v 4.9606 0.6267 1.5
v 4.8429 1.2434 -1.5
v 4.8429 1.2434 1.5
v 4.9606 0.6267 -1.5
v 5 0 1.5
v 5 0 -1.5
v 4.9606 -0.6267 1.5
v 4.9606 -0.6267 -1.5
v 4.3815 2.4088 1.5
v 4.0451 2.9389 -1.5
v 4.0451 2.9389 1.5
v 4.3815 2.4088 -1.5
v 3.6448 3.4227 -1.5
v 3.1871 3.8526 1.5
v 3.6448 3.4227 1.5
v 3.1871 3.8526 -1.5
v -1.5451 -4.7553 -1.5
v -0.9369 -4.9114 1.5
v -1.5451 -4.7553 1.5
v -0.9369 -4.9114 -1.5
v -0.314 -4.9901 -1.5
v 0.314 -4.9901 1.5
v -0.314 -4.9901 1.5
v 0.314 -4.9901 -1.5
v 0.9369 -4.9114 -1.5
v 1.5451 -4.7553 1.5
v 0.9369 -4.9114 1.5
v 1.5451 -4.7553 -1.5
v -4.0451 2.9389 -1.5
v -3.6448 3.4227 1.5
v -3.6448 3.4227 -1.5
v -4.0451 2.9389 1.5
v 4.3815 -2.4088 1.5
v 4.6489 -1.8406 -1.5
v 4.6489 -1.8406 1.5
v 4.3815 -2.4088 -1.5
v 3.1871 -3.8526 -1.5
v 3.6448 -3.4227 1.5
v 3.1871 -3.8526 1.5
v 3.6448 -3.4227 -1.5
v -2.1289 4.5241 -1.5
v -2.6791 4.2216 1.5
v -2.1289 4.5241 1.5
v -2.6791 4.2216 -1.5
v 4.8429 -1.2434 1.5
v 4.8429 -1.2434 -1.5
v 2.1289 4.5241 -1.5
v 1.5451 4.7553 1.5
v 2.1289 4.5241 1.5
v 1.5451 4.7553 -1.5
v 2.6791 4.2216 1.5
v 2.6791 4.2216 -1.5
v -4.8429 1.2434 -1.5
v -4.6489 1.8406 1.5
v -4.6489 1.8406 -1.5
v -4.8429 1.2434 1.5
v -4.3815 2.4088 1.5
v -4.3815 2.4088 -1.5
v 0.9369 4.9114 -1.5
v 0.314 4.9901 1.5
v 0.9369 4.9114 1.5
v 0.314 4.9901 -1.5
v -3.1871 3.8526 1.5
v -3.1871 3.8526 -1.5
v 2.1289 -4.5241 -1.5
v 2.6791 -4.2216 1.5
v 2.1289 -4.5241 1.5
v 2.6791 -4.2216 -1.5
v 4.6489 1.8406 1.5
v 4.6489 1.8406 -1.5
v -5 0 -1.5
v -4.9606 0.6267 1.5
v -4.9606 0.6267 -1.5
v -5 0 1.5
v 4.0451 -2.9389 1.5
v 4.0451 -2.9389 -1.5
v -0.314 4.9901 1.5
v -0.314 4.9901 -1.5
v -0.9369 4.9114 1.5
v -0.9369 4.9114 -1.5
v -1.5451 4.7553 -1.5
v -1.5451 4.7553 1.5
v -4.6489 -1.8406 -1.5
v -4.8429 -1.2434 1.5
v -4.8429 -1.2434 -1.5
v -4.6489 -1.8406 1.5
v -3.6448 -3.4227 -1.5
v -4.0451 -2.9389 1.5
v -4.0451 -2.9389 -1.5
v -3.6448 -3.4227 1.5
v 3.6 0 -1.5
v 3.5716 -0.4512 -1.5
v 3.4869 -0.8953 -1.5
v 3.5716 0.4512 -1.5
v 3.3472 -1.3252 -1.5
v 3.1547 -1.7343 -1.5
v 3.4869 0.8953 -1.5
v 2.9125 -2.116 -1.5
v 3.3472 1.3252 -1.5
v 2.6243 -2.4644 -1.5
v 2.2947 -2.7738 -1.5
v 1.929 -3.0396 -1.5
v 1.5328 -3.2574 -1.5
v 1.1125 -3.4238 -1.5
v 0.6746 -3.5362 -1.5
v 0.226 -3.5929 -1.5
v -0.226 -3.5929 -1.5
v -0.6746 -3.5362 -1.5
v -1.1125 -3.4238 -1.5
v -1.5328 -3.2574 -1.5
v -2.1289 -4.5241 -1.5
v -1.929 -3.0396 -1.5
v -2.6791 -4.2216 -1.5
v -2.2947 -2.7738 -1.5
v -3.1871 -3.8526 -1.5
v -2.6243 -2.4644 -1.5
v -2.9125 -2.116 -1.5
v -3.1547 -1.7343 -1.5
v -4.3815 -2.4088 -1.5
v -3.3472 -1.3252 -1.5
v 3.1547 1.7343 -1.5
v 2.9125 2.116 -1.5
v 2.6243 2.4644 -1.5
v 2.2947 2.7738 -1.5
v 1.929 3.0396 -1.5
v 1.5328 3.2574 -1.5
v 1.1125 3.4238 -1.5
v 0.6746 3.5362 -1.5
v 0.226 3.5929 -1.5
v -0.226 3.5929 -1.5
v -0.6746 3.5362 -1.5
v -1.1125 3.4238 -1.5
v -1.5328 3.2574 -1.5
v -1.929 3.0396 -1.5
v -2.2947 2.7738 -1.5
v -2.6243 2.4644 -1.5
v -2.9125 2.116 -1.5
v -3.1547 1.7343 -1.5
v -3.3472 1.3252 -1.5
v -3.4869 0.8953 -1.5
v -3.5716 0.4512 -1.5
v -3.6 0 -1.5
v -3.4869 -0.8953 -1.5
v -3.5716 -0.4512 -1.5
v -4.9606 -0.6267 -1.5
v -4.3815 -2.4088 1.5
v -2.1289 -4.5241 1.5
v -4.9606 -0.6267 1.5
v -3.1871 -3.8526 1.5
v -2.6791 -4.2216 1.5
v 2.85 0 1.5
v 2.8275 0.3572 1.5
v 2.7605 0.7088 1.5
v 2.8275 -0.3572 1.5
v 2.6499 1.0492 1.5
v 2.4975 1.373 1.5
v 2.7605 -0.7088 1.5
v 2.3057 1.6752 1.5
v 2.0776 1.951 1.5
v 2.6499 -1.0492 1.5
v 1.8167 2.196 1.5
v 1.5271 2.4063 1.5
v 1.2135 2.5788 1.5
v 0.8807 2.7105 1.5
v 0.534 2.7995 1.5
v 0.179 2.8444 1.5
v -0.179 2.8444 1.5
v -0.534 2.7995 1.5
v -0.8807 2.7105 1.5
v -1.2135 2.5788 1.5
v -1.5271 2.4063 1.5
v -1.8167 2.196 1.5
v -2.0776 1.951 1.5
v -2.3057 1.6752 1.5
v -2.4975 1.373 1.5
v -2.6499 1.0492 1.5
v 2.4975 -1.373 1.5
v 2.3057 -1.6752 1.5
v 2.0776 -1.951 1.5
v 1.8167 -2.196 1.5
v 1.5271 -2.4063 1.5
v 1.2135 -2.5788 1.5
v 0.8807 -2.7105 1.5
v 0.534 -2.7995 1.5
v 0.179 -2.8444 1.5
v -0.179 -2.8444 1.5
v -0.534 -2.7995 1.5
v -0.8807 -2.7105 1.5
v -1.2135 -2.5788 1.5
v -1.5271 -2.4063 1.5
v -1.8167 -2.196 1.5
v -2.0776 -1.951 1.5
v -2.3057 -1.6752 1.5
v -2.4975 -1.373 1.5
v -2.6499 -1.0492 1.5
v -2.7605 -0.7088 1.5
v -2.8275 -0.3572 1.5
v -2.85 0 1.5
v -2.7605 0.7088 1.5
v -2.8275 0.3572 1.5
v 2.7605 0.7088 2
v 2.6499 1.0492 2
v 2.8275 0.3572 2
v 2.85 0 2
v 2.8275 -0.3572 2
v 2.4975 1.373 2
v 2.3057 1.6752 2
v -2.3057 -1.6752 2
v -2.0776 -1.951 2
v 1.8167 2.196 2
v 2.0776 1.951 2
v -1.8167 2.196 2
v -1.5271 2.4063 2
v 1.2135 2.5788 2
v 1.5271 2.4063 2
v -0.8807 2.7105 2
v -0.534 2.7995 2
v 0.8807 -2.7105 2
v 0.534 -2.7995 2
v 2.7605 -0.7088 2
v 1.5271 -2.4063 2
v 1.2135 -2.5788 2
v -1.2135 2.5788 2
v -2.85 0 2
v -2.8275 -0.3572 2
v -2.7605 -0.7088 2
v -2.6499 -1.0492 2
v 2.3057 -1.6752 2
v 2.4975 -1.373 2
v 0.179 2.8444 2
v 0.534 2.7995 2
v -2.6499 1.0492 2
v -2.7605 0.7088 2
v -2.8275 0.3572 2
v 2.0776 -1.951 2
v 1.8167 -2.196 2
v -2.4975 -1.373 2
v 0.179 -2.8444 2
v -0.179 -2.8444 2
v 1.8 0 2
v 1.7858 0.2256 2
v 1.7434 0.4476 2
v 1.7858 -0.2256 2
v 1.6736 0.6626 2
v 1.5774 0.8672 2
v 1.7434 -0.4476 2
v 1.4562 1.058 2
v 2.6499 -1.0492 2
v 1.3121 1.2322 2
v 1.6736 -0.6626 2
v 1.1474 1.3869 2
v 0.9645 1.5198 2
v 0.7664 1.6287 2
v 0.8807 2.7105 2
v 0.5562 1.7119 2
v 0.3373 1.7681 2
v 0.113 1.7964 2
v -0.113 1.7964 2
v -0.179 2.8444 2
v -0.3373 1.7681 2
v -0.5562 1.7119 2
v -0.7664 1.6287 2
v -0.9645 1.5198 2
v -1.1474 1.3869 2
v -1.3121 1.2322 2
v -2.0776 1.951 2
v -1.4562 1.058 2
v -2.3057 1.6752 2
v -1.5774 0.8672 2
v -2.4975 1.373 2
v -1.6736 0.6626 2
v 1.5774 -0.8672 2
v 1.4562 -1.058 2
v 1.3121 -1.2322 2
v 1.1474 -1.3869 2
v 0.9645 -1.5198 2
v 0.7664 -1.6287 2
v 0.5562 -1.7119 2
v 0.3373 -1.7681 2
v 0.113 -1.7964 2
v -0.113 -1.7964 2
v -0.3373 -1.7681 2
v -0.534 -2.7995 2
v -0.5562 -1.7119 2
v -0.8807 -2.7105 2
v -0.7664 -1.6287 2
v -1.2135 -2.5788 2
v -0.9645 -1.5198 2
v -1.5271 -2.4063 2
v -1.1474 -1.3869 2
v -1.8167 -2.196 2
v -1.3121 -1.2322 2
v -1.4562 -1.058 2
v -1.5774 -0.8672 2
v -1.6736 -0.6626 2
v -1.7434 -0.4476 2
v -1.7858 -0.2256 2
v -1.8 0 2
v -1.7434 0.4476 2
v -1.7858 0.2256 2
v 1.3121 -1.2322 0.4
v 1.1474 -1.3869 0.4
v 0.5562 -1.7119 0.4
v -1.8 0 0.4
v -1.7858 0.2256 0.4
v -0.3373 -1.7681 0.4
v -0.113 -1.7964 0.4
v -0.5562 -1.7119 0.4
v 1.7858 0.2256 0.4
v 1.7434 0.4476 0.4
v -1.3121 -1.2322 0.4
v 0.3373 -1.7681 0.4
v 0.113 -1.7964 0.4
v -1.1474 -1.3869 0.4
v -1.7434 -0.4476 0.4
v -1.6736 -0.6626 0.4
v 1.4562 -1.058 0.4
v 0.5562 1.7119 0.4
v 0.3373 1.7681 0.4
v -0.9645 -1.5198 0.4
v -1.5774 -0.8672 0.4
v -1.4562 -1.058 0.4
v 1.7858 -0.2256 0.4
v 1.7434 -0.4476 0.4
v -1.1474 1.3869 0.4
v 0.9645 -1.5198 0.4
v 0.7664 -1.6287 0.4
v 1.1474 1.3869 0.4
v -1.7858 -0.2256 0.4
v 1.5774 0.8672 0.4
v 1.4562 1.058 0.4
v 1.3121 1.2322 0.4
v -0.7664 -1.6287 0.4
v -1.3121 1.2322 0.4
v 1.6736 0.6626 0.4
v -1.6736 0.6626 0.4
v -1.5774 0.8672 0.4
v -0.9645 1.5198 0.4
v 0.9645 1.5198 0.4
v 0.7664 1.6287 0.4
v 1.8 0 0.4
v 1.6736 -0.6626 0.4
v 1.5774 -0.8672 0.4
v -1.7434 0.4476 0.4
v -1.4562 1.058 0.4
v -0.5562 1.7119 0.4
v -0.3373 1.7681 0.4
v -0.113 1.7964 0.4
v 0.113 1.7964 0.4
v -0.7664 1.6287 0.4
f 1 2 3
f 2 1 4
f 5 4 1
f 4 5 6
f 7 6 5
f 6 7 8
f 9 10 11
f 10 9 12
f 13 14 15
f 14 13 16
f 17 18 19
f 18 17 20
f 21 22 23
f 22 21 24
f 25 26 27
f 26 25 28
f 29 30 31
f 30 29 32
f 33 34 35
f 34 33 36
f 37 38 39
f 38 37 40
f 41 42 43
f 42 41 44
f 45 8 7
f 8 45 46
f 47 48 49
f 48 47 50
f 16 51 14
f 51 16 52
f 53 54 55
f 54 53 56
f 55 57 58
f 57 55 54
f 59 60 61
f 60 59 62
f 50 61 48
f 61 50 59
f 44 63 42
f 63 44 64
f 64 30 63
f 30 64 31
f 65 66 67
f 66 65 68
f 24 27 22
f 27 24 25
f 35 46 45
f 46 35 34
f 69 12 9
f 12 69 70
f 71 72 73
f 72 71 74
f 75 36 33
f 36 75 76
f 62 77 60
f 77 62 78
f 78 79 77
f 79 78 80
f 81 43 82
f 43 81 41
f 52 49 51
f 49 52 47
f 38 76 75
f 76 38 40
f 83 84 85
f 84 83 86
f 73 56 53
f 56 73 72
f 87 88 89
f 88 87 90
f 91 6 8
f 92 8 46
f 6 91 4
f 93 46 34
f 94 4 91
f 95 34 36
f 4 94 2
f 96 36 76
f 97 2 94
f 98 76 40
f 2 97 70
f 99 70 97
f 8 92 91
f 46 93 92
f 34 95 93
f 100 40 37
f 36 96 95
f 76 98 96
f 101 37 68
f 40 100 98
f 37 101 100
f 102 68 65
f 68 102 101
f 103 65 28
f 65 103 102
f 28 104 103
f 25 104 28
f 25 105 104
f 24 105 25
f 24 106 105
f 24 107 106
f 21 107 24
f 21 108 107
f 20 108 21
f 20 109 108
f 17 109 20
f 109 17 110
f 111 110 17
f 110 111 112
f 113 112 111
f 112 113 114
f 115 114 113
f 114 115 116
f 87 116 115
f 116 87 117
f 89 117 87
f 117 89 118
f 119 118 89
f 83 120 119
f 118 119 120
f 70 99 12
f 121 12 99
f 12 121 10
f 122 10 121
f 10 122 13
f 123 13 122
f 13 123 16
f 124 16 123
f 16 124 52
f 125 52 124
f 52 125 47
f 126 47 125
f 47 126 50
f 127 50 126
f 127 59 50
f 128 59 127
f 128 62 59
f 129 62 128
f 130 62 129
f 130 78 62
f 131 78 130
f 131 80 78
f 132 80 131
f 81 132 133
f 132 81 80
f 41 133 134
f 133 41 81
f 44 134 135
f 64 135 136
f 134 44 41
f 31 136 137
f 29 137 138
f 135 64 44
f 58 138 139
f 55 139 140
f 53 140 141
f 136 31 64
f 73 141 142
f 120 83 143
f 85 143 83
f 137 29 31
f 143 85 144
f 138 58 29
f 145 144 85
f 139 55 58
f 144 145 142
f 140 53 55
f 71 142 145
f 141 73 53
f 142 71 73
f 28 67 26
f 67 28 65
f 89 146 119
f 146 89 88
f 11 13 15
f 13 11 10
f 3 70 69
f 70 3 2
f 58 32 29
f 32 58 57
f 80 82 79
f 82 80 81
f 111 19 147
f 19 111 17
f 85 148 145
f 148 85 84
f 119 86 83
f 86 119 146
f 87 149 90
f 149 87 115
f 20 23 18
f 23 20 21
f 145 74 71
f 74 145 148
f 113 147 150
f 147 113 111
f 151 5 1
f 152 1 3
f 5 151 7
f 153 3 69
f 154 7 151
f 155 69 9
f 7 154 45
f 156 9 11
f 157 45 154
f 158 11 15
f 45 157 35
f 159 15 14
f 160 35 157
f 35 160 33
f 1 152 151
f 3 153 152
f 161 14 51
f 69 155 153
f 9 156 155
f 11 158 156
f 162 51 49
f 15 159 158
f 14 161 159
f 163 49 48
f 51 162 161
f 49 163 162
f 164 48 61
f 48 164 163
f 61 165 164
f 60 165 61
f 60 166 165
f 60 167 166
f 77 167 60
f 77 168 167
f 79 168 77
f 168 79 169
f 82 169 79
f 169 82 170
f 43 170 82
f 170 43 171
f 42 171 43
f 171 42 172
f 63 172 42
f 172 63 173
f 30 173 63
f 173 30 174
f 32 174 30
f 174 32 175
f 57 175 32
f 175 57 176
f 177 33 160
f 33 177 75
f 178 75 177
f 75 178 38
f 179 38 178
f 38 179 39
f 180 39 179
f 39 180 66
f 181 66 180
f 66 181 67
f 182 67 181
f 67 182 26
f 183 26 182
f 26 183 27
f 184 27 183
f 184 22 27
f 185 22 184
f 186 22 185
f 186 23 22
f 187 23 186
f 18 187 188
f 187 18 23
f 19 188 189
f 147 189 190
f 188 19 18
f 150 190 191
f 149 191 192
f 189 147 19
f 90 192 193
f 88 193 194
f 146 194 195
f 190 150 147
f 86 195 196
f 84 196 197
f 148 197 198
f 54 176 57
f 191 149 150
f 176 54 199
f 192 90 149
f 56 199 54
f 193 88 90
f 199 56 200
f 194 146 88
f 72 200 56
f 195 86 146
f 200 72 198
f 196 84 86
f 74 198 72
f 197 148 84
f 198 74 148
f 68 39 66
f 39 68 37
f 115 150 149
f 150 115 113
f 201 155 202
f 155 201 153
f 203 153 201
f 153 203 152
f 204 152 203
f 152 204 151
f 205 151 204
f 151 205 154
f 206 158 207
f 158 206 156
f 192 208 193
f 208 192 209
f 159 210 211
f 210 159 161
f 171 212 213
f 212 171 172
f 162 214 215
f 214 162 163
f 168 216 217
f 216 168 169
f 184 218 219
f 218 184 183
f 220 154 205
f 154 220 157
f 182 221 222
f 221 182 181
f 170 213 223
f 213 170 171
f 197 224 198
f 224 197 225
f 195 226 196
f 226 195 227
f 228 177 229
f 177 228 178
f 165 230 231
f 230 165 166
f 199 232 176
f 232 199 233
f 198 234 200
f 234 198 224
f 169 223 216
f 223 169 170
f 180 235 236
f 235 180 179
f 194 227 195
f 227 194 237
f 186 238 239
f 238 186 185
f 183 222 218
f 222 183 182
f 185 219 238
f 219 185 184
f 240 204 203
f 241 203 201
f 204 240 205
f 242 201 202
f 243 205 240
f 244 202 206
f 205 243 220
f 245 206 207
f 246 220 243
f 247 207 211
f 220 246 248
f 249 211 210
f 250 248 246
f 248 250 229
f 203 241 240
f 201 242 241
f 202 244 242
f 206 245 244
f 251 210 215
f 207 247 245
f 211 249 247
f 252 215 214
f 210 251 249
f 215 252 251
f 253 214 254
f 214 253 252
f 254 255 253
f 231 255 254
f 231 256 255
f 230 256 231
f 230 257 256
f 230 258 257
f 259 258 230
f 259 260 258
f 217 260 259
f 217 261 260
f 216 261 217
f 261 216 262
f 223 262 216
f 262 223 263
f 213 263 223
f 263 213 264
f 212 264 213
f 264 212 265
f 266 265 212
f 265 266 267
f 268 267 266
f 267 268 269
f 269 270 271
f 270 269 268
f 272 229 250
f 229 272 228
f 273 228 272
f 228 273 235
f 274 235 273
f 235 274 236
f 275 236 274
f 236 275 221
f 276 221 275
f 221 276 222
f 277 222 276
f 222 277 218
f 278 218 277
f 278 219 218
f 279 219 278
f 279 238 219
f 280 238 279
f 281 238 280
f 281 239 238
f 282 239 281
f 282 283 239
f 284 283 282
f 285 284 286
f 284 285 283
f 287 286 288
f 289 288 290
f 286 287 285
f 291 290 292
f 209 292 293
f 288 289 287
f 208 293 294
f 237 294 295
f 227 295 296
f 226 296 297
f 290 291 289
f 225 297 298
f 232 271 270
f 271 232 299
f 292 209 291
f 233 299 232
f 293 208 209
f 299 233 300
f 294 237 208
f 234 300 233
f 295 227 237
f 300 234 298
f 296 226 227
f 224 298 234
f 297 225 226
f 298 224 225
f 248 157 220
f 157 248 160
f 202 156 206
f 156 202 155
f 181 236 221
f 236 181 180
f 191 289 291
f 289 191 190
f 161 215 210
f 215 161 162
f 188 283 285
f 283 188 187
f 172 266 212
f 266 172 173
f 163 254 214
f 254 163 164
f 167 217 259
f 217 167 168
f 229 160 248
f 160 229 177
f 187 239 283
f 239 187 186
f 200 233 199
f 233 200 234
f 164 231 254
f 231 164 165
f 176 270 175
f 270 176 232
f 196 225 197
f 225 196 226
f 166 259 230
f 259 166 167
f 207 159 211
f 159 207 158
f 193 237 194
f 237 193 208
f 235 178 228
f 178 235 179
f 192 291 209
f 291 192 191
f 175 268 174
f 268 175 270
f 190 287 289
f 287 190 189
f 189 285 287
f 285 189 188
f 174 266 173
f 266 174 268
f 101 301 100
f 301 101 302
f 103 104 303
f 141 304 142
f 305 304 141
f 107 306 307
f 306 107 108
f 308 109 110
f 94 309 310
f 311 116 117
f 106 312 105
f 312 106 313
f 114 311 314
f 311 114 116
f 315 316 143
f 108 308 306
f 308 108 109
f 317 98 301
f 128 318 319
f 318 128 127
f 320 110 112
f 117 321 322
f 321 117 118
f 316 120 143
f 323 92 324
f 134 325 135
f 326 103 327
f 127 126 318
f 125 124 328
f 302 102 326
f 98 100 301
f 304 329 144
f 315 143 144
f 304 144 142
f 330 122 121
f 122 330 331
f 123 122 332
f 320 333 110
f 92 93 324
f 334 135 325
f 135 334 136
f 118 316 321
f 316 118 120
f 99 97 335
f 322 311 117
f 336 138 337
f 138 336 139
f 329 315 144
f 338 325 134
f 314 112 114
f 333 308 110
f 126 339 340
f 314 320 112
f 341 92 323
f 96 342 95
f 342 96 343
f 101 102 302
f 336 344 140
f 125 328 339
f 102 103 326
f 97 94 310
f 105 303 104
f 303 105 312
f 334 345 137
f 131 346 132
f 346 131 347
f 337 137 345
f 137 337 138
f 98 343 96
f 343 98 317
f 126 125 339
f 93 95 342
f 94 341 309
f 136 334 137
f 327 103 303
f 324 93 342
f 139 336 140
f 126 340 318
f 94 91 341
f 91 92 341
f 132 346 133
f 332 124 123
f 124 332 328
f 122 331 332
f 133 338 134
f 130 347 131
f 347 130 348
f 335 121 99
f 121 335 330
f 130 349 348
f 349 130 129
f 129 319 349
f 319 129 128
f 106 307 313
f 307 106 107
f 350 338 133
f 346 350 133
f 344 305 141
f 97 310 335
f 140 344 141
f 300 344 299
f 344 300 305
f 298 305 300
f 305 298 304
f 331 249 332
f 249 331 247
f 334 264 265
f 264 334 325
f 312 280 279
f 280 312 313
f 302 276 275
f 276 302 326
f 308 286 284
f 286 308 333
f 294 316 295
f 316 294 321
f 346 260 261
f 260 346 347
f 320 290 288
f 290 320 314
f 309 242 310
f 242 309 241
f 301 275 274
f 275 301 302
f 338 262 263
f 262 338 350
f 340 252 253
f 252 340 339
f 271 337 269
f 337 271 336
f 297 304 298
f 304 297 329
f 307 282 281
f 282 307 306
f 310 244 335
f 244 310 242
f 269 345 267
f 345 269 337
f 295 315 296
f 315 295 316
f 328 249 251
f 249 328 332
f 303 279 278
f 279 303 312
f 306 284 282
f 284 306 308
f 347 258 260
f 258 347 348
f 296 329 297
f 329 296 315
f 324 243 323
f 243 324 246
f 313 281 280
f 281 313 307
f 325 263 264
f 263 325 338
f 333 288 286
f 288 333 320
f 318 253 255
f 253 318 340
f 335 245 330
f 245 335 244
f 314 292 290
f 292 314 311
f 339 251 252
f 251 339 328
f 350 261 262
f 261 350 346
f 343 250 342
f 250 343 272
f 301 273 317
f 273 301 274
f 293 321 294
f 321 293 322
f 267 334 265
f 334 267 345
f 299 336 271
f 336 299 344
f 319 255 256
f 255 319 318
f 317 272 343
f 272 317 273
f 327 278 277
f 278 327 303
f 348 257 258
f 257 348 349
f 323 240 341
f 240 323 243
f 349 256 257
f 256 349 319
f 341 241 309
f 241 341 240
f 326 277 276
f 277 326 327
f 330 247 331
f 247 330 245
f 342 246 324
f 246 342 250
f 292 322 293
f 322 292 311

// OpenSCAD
$fn = 50;


difference() {
	union() {
		translate(v = [0, 0, -1.5000000000]) {
			cylinder(h = 3, r = 5.0000000000);
		}
		translate(v = [0, 0, -1.5000000000]) {
			cylinder(h = 3.5000000000, r = 2.8500000000);
		}
	}
	union() {
		translate(v = [0, 0, -1.5000000000]) {
			rotate(a = [0, 180, 0]) {
				difference() {
					union() {
						translate(v = [0, 0, -3.5000000000]) {
							cylinder(h = 3.5000000000, r = 1.5000000000);
						}
						translate(v = [0, 0, -1.9000000000]) {
							cylinder(h = 1.9000000000, r1 = 1.8000000000, r2 = 3.6000000000);
						}
						translate(v = [0, 0, -3.5000000000]) {
							cylinder(h = 3.5000000000, r = 1.8000000000);
						}
						translate(v = [0, 0, -3.5000000000]) {
							cylinder(h = 3.5000000000, r = 1.5000000000);
						}
					}
					union();
				}
			}
		}
		translate(v = [0, 0, -100.0000000000]) {
			cylinder(h = 200, r = 1.8000000000);
		}
	}
}
